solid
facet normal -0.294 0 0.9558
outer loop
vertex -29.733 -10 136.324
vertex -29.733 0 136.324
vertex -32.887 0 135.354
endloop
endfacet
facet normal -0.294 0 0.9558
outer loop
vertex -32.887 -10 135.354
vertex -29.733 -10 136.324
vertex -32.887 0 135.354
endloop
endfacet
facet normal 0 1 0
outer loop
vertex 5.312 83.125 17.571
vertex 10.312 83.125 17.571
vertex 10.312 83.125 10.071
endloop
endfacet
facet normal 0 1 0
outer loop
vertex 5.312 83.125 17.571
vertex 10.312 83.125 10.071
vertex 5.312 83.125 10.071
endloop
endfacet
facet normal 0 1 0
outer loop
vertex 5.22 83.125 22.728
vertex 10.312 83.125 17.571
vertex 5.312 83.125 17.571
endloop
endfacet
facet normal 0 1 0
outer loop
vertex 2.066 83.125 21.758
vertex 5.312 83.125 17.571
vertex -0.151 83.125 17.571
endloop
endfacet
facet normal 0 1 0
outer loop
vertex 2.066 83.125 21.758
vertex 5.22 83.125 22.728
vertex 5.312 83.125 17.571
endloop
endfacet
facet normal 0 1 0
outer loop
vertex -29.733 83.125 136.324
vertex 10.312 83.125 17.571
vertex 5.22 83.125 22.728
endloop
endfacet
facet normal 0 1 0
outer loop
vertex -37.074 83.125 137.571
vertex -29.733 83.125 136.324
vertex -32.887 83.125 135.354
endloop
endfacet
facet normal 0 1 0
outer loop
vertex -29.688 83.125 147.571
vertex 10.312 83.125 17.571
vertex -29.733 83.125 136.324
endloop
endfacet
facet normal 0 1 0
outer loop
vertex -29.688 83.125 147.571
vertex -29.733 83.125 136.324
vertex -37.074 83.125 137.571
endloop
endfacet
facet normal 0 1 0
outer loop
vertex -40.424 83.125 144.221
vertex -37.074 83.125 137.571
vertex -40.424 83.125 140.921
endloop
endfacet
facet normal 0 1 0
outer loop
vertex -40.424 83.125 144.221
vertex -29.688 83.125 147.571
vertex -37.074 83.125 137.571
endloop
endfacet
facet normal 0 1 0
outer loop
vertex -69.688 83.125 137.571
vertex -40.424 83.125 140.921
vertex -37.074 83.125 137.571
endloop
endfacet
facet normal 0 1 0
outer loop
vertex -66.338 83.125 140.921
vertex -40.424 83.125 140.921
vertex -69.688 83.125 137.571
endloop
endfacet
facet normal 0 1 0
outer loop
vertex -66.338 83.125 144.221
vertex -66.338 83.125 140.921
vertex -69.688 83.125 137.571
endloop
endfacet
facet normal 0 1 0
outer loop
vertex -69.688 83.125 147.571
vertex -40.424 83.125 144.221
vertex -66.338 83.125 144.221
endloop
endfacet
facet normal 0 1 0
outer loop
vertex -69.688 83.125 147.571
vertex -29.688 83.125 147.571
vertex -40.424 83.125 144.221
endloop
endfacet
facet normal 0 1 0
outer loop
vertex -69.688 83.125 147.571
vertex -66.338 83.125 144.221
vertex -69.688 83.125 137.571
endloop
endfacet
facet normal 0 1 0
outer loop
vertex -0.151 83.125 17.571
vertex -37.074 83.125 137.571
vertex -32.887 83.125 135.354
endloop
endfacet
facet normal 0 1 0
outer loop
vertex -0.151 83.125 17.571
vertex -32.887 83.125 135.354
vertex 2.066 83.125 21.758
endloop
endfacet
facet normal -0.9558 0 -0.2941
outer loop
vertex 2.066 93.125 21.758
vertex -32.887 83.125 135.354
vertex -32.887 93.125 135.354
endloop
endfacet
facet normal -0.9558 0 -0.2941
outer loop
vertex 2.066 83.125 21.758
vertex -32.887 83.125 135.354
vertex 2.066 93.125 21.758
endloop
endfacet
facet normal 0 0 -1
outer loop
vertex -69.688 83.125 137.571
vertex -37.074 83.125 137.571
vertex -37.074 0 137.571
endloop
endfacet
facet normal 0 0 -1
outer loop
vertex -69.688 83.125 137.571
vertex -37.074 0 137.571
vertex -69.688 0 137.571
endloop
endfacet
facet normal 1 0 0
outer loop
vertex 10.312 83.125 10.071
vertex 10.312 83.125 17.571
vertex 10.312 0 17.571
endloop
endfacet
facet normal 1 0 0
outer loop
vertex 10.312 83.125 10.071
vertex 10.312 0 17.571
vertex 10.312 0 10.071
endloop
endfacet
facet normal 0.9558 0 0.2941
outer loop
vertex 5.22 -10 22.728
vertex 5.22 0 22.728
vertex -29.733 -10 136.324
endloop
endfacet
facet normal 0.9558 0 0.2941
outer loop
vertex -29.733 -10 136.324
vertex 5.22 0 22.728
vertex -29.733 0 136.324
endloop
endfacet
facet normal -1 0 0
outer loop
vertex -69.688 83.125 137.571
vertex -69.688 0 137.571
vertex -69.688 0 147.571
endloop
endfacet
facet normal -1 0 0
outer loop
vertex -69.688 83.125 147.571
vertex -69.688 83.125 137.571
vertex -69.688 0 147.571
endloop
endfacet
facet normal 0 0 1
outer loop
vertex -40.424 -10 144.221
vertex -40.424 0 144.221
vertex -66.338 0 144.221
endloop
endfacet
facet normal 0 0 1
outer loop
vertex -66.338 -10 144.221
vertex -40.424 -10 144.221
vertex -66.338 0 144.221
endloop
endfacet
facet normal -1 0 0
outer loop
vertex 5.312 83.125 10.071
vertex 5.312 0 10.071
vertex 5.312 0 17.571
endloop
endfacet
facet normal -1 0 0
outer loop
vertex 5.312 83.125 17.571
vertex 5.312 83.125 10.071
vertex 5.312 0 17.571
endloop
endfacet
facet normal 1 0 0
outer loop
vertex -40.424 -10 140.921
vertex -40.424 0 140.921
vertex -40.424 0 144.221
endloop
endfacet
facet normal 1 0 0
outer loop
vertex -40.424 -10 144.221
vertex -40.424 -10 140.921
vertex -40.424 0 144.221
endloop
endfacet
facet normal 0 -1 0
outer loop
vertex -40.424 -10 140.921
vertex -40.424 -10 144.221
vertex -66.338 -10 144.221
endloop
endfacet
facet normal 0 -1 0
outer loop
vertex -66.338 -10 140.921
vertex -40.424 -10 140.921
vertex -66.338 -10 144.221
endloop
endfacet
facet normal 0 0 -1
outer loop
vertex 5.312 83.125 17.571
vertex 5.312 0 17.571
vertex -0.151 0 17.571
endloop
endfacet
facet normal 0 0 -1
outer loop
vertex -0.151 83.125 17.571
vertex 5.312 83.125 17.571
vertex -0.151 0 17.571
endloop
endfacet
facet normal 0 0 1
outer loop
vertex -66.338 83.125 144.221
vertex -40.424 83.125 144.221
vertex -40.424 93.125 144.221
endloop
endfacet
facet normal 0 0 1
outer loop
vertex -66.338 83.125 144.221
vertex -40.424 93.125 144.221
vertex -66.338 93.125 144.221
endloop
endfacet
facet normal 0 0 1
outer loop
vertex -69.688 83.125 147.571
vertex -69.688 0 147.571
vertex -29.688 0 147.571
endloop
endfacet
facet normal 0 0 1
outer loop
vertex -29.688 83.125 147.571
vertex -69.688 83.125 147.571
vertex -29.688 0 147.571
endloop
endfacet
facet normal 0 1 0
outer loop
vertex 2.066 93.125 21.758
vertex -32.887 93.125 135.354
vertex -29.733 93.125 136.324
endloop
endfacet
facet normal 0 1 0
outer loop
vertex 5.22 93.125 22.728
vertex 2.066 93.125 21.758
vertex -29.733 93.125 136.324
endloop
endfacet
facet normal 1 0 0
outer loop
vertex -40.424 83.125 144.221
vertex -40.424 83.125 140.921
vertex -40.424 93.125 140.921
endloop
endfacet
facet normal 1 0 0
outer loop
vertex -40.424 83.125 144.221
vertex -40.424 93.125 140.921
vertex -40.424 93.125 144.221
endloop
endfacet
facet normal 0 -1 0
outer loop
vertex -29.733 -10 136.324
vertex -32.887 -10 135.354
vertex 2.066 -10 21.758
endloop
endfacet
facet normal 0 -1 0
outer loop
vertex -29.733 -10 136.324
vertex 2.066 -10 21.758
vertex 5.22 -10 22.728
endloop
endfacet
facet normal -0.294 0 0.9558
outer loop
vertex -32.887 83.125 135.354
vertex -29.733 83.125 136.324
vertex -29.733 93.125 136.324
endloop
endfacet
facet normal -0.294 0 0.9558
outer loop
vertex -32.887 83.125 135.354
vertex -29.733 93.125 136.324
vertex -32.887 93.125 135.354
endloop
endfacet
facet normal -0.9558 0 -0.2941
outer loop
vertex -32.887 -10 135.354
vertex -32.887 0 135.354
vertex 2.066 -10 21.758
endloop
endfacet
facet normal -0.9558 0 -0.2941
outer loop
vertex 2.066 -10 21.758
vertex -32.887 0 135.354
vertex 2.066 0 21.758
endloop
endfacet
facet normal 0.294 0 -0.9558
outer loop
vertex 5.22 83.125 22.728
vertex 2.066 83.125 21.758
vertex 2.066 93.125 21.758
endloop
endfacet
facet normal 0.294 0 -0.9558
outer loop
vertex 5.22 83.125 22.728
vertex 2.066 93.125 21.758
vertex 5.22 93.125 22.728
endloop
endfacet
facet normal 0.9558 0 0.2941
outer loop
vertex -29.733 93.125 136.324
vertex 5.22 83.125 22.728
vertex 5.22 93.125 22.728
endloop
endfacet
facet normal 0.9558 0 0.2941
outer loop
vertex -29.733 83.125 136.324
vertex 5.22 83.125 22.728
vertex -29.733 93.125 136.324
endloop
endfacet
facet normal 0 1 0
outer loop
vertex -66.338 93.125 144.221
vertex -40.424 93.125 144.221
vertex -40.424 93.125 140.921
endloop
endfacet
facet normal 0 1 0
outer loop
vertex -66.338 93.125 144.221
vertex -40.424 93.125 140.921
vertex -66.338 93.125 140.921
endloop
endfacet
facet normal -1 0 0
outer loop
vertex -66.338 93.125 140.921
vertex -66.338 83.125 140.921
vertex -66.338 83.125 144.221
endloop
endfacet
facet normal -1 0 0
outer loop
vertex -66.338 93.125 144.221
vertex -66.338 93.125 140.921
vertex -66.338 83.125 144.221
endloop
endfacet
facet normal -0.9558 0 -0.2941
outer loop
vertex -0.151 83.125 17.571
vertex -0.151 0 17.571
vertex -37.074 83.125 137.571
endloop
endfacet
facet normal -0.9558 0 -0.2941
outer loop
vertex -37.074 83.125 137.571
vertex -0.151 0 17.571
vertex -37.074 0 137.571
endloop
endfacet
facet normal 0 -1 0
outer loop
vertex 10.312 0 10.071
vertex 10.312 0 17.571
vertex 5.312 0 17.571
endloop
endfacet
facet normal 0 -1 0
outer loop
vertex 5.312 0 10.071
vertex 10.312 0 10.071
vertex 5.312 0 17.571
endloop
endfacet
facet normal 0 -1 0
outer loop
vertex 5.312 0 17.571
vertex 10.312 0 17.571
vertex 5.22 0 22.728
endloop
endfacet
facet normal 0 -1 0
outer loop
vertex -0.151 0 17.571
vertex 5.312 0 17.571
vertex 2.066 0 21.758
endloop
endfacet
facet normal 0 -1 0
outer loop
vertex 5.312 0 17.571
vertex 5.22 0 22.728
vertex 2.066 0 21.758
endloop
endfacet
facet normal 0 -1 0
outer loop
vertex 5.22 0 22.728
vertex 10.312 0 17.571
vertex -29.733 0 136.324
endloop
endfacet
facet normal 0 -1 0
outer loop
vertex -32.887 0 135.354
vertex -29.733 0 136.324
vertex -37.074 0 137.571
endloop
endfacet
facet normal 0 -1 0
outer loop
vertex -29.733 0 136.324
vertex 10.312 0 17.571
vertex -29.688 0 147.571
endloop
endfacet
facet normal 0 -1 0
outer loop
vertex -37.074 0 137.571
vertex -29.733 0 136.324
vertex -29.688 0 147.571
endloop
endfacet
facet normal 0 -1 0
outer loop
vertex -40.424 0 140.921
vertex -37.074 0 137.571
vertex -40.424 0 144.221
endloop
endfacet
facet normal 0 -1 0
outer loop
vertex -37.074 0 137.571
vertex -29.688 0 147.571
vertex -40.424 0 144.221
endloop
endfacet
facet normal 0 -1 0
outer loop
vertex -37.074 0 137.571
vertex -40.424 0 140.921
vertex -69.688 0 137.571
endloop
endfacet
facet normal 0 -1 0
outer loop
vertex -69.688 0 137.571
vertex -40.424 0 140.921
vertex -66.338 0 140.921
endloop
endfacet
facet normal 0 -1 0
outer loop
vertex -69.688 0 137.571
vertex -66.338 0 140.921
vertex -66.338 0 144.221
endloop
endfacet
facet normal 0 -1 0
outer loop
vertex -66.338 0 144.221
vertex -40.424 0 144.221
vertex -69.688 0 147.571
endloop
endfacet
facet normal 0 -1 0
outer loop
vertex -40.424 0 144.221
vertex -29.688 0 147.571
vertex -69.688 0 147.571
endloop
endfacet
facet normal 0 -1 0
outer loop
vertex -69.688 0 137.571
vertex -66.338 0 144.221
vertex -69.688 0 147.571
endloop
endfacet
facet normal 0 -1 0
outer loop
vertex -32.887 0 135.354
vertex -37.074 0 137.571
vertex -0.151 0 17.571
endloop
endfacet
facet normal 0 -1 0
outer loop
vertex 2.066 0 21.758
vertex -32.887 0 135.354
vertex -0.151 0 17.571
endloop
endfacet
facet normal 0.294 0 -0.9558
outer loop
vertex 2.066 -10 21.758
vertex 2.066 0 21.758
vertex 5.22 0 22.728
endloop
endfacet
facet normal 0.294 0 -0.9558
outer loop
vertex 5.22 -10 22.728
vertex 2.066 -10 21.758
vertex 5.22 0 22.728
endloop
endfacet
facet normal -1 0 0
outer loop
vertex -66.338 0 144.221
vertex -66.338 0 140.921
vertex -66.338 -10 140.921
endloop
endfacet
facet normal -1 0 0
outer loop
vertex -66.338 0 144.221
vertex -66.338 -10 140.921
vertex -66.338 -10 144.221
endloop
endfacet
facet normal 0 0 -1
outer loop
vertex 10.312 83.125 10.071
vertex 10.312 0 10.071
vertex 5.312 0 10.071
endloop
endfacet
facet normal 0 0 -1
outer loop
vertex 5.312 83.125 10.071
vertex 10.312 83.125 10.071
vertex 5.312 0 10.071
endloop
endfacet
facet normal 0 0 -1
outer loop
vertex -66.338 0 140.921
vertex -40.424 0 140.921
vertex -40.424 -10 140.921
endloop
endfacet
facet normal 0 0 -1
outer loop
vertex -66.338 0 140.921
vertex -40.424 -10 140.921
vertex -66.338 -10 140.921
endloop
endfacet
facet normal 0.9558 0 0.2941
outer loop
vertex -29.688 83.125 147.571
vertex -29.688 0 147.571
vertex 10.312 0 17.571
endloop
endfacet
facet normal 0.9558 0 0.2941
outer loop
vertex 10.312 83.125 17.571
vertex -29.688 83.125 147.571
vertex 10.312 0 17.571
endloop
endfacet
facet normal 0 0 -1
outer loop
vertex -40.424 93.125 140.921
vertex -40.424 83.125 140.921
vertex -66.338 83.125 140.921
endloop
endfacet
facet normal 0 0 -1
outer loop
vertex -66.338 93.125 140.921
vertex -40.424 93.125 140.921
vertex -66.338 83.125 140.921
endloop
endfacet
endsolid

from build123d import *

# Parameters (mm, degrees)
BOSS_EXTRUDE1_DEPTH = 83.125
SKETCH2_W           = 25.914253455
SKETCH2_H           = 3.3
BOSS_EXTRUDE2_DEPTH = 10


with BuildPart() as part:
    # Sketch1 → Boss-Extrude1 (new body)
    with BuildSketch(Plane(origin=(0, 0, 0), x_dir=(-1, 0, 0), z_dir=(0, 1, 0))):
        Polygon((69.688093764, 147.570616058), (29.688093764, 147.570616058), (39.245883851, 144.62975757), (37.073840309, 137.570616058), (69.688093764, 137.570616058), align=None)
        Polygon((39.245883851, 144.62975757), (29.688093764, 147.570616058), (29.688093764, 137.570616058), (37.073840309, 137.570616058), align=None)
        Polygon((29.688093764, 147.570616058), (-10.311906236, 17.570616058), (-5.311906236, 17.570616058), (0.150763386, 17.570616058), (37.073840309, 137.570616058), (29.688093764, 137.570616058), align=None)
        Polygon((-5.311906236, 16.03215452), (-10.311906236, 17.570616058), (-10.311906236, 10.070616058), (-5.311906236, 10.070616058), align=None)
        Polygon((-5.311906236, 17.570616058), (-10.311906236, 17.570616058), (-5.311906236, 16.03215452), align=None)
    extrude(amount=BOSS_EXTRUDE1_DEPTH)

    # Sketch2 → Boss-Extrude2 (add)
    with BuildSketch(Plane(origin=(0, 83.125, 0), x_dir=(-1, 0, 0), z_dir=(0, 1, 0))):
        Polygon((32.886793036, 135.353943973), (-2.0659087, 21.757663331), (-5.219979428, 22.728146632), (29.732722307, 136.324427274), align=None)
        with Locations((53.380967037, 142.570616058)):
            Rectangle(SKETCH2_W, SKETCH2_H)
    boss_extrude2 = extrude(amount=BOSS_EXTRUDE2_DEPTH)

    # Mirror1: Boss-Extrude2 across plane
    add(boss_extrude2.mirror(Plane.ZX.offset(41.5625)))


solid = part.part
